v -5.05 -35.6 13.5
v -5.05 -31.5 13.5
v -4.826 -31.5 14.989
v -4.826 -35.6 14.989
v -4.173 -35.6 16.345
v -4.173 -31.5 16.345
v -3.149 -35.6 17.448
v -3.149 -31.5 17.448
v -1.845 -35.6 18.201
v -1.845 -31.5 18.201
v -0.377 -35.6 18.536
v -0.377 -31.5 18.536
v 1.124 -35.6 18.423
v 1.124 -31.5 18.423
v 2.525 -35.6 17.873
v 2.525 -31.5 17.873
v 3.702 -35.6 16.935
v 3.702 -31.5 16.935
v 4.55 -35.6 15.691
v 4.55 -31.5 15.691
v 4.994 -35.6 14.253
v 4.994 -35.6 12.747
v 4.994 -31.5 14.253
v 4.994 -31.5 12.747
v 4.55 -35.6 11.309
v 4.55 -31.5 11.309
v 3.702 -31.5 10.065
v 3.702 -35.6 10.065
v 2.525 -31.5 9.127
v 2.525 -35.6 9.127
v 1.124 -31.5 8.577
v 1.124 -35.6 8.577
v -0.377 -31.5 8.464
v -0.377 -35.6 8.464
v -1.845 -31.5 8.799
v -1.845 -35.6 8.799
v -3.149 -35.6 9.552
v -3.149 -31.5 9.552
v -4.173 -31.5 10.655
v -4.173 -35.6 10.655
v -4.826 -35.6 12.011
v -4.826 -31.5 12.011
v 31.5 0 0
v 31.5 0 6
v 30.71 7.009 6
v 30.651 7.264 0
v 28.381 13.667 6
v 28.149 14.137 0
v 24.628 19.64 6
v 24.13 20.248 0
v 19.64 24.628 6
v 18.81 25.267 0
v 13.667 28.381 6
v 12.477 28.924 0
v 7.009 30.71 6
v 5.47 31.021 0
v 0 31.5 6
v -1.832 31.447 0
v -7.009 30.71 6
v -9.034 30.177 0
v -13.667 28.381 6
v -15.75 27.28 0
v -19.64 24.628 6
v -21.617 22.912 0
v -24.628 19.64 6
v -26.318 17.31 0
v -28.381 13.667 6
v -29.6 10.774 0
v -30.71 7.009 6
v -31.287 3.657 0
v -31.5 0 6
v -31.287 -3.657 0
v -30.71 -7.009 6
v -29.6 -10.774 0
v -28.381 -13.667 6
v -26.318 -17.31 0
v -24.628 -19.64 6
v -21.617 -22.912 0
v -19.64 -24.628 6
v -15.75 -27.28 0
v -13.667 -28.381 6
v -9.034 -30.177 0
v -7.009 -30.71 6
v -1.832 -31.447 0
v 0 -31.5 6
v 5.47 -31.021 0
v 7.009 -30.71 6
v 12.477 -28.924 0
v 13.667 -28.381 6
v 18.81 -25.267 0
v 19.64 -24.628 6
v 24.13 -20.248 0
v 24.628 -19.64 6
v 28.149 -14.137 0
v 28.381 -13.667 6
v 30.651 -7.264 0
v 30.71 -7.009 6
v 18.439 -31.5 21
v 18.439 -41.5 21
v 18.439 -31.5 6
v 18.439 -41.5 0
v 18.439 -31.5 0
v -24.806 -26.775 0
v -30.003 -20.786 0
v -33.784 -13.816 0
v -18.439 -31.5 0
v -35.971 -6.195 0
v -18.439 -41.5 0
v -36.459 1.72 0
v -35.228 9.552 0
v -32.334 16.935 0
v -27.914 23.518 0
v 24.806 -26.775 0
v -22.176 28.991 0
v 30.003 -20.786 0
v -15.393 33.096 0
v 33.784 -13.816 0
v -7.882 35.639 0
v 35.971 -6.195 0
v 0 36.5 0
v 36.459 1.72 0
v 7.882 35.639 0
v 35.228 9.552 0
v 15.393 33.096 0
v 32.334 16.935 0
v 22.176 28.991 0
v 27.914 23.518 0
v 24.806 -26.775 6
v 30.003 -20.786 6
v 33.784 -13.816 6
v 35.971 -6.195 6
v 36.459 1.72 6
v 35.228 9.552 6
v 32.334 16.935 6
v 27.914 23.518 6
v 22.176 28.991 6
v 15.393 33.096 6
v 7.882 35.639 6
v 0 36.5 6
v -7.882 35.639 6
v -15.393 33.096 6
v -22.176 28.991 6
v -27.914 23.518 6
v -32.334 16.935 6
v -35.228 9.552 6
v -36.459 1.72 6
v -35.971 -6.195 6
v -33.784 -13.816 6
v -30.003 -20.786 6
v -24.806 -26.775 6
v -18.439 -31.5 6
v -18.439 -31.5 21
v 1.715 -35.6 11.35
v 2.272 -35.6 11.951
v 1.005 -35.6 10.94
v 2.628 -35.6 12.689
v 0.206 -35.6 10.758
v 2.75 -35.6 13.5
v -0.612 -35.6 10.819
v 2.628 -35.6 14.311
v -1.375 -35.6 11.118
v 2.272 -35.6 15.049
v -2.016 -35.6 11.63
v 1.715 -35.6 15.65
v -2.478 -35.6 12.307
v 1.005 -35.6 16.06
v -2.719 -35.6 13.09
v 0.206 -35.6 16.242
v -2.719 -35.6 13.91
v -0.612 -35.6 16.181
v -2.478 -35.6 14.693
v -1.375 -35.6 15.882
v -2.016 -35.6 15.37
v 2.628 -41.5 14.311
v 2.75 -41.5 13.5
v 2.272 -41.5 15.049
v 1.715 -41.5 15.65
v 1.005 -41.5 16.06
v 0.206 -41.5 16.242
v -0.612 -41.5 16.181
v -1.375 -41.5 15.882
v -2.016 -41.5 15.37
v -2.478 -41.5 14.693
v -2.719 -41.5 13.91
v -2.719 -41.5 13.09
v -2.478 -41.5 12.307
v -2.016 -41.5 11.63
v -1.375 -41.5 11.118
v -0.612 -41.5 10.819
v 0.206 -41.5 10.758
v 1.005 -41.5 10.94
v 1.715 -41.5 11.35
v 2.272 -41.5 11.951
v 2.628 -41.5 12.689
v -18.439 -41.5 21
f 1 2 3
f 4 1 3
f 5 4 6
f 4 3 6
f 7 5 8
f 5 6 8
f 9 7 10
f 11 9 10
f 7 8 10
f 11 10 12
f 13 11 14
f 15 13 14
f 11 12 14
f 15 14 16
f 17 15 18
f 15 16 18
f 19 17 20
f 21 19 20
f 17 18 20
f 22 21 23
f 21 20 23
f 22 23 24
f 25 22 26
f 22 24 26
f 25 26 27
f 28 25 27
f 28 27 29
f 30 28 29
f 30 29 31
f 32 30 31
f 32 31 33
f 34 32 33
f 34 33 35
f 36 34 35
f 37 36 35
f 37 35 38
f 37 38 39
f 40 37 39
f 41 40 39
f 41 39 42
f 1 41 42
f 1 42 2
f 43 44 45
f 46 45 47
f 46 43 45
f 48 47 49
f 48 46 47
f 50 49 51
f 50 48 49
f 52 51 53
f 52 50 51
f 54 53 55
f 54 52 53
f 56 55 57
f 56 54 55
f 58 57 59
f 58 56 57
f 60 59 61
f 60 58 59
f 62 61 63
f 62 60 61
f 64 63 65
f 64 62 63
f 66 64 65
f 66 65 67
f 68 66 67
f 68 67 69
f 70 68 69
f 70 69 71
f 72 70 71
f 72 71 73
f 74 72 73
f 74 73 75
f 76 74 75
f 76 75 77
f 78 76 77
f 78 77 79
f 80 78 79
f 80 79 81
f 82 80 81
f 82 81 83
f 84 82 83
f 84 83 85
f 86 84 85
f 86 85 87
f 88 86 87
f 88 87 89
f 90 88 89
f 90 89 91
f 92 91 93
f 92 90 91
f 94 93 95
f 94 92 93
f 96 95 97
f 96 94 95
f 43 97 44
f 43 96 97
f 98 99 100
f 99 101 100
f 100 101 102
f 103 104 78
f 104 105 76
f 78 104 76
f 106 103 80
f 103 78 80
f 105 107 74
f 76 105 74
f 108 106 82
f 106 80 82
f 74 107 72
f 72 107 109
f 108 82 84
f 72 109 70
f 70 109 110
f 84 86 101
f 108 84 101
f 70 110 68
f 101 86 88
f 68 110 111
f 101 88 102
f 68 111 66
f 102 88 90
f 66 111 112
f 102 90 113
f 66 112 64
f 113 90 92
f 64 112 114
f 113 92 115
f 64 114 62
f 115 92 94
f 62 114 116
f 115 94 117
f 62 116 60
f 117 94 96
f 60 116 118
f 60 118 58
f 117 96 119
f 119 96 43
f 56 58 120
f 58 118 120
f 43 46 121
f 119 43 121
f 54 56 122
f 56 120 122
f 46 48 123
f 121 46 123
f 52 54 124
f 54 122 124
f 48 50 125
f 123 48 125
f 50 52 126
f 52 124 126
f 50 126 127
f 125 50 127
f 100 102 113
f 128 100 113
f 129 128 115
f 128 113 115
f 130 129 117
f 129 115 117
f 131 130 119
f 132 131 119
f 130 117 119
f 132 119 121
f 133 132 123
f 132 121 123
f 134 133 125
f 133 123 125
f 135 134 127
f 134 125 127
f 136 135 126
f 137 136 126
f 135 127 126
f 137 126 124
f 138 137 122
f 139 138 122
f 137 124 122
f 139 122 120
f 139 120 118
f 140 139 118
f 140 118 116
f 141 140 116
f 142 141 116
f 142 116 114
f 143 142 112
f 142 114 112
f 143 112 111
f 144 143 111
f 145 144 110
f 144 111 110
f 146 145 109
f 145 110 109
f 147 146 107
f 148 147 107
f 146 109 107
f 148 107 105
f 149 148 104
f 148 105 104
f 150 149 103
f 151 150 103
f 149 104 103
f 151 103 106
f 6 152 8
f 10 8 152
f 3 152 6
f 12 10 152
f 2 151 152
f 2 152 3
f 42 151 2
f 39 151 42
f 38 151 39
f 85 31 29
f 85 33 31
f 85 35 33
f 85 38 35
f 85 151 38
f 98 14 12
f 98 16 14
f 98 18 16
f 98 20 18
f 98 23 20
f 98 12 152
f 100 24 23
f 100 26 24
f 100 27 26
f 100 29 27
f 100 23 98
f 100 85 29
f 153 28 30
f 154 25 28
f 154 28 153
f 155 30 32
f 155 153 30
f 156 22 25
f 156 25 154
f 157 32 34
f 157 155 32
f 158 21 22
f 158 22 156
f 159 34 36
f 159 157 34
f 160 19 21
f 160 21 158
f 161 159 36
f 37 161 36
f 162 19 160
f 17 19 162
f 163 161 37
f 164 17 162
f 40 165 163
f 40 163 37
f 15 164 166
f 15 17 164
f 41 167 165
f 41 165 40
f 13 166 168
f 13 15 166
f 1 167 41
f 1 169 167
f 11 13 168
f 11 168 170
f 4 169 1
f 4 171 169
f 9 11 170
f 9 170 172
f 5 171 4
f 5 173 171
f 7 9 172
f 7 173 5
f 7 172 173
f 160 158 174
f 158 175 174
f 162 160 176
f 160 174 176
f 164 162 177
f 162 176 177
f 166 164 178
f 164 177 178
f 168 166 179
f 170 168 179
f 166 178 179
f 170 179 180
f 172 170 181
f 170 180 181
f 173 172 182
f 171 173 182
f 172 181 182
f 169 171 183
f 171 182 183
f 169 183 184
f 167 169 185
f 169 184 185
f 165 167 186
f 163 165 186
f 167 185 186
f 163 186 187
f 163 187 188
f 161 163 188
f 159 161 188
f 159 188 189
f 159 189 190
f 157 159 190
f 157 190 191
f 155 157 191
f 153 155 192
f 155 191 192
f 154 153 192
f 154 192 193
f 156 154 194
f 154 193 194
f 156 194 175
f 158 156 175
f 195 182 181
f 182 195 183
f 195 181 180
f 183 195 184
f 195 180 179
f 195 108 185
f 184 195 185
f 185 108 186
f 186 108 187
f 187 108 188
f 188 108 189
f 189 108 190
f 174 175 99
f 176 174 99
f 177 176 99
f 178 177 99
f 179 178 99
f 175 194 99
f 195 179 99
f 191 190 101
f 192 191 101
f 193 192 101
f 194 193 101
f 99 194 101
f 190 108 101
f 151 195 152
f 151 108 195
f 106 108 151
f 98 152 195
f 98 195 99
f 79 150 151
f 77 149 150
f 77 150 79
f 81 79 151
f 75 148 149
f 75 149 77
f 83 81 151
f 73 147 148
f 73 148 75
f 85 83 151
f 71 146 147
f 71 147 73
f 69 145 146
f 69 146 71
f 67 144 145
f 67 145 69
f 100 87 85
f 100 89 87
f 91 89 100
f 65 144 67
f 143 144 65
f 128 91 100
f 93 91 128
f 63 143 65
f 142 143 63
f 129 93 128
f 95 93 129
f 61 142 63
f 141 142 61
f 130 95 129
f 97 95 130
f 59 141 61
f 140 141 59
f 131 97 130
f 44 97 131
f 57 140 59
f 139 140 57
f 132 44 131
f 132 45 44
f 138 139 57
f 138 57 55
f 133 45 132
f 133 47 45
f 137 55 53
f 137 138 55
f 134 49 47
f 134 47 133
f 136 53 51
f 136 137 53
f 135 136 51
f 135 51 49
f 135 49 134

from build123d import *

# Parameters (mm, degrees)
SKETCH_R         = 31.5
PAD_DEPTH        = 6
SKETCH001_W      = 36.878178
SKETCH001_H      = 10
PAD001_DEPTH     = 15
HOLE_D           = 5.5
HOLE_DEPTH       = 25
HOLE_CBORE_D     = 10.1
HOLE_CBORE_DEPTH = 4.1


with BuildPart() as part:
    # Sketch → Pad (new body)
    with BuildSketch(Plane.XY):
        with BuildLine():
            ThreePointArc((18.439089, -31.5), (0, 36.5), (-18.439089, -31.5))
            Line((-18.439089, -31.5), (-18.439089, -41.5))
            Line((-18.439089, -41.5), (18.439089, -41.5))
            Line((18.439089, -41.5), (18.439089, -31.5))
        make_face()
        Circle(SKETCH_R, mode=Mode.SUBTRACT)
    extrude(amount=PAD_DEPTH)

    # Sketch001 (on Face7 of Pad) → Pad001 (join)
    with BuildSketch(Plane.XY.offset(6)):
        with Locations((0, -36.5)):
            Rectangle(SKETCH001_W, SKETCH001_H)
    extrude(amount=PAD001_DEPTH)

    # Hole
    with Locations(Plane(origin=(0, -31.5, 0), x_dir=(-1, 0, 0), z_dir=(0, 1, 0))):
        with Locations((0, 13.5)):
            CounterBoreHole(HOLE_D / 2, HOLE_CBORE_D / 2, HOLE_CBORE_DEPTH, depth=HOLE_DEPTH)


solid = part.part
